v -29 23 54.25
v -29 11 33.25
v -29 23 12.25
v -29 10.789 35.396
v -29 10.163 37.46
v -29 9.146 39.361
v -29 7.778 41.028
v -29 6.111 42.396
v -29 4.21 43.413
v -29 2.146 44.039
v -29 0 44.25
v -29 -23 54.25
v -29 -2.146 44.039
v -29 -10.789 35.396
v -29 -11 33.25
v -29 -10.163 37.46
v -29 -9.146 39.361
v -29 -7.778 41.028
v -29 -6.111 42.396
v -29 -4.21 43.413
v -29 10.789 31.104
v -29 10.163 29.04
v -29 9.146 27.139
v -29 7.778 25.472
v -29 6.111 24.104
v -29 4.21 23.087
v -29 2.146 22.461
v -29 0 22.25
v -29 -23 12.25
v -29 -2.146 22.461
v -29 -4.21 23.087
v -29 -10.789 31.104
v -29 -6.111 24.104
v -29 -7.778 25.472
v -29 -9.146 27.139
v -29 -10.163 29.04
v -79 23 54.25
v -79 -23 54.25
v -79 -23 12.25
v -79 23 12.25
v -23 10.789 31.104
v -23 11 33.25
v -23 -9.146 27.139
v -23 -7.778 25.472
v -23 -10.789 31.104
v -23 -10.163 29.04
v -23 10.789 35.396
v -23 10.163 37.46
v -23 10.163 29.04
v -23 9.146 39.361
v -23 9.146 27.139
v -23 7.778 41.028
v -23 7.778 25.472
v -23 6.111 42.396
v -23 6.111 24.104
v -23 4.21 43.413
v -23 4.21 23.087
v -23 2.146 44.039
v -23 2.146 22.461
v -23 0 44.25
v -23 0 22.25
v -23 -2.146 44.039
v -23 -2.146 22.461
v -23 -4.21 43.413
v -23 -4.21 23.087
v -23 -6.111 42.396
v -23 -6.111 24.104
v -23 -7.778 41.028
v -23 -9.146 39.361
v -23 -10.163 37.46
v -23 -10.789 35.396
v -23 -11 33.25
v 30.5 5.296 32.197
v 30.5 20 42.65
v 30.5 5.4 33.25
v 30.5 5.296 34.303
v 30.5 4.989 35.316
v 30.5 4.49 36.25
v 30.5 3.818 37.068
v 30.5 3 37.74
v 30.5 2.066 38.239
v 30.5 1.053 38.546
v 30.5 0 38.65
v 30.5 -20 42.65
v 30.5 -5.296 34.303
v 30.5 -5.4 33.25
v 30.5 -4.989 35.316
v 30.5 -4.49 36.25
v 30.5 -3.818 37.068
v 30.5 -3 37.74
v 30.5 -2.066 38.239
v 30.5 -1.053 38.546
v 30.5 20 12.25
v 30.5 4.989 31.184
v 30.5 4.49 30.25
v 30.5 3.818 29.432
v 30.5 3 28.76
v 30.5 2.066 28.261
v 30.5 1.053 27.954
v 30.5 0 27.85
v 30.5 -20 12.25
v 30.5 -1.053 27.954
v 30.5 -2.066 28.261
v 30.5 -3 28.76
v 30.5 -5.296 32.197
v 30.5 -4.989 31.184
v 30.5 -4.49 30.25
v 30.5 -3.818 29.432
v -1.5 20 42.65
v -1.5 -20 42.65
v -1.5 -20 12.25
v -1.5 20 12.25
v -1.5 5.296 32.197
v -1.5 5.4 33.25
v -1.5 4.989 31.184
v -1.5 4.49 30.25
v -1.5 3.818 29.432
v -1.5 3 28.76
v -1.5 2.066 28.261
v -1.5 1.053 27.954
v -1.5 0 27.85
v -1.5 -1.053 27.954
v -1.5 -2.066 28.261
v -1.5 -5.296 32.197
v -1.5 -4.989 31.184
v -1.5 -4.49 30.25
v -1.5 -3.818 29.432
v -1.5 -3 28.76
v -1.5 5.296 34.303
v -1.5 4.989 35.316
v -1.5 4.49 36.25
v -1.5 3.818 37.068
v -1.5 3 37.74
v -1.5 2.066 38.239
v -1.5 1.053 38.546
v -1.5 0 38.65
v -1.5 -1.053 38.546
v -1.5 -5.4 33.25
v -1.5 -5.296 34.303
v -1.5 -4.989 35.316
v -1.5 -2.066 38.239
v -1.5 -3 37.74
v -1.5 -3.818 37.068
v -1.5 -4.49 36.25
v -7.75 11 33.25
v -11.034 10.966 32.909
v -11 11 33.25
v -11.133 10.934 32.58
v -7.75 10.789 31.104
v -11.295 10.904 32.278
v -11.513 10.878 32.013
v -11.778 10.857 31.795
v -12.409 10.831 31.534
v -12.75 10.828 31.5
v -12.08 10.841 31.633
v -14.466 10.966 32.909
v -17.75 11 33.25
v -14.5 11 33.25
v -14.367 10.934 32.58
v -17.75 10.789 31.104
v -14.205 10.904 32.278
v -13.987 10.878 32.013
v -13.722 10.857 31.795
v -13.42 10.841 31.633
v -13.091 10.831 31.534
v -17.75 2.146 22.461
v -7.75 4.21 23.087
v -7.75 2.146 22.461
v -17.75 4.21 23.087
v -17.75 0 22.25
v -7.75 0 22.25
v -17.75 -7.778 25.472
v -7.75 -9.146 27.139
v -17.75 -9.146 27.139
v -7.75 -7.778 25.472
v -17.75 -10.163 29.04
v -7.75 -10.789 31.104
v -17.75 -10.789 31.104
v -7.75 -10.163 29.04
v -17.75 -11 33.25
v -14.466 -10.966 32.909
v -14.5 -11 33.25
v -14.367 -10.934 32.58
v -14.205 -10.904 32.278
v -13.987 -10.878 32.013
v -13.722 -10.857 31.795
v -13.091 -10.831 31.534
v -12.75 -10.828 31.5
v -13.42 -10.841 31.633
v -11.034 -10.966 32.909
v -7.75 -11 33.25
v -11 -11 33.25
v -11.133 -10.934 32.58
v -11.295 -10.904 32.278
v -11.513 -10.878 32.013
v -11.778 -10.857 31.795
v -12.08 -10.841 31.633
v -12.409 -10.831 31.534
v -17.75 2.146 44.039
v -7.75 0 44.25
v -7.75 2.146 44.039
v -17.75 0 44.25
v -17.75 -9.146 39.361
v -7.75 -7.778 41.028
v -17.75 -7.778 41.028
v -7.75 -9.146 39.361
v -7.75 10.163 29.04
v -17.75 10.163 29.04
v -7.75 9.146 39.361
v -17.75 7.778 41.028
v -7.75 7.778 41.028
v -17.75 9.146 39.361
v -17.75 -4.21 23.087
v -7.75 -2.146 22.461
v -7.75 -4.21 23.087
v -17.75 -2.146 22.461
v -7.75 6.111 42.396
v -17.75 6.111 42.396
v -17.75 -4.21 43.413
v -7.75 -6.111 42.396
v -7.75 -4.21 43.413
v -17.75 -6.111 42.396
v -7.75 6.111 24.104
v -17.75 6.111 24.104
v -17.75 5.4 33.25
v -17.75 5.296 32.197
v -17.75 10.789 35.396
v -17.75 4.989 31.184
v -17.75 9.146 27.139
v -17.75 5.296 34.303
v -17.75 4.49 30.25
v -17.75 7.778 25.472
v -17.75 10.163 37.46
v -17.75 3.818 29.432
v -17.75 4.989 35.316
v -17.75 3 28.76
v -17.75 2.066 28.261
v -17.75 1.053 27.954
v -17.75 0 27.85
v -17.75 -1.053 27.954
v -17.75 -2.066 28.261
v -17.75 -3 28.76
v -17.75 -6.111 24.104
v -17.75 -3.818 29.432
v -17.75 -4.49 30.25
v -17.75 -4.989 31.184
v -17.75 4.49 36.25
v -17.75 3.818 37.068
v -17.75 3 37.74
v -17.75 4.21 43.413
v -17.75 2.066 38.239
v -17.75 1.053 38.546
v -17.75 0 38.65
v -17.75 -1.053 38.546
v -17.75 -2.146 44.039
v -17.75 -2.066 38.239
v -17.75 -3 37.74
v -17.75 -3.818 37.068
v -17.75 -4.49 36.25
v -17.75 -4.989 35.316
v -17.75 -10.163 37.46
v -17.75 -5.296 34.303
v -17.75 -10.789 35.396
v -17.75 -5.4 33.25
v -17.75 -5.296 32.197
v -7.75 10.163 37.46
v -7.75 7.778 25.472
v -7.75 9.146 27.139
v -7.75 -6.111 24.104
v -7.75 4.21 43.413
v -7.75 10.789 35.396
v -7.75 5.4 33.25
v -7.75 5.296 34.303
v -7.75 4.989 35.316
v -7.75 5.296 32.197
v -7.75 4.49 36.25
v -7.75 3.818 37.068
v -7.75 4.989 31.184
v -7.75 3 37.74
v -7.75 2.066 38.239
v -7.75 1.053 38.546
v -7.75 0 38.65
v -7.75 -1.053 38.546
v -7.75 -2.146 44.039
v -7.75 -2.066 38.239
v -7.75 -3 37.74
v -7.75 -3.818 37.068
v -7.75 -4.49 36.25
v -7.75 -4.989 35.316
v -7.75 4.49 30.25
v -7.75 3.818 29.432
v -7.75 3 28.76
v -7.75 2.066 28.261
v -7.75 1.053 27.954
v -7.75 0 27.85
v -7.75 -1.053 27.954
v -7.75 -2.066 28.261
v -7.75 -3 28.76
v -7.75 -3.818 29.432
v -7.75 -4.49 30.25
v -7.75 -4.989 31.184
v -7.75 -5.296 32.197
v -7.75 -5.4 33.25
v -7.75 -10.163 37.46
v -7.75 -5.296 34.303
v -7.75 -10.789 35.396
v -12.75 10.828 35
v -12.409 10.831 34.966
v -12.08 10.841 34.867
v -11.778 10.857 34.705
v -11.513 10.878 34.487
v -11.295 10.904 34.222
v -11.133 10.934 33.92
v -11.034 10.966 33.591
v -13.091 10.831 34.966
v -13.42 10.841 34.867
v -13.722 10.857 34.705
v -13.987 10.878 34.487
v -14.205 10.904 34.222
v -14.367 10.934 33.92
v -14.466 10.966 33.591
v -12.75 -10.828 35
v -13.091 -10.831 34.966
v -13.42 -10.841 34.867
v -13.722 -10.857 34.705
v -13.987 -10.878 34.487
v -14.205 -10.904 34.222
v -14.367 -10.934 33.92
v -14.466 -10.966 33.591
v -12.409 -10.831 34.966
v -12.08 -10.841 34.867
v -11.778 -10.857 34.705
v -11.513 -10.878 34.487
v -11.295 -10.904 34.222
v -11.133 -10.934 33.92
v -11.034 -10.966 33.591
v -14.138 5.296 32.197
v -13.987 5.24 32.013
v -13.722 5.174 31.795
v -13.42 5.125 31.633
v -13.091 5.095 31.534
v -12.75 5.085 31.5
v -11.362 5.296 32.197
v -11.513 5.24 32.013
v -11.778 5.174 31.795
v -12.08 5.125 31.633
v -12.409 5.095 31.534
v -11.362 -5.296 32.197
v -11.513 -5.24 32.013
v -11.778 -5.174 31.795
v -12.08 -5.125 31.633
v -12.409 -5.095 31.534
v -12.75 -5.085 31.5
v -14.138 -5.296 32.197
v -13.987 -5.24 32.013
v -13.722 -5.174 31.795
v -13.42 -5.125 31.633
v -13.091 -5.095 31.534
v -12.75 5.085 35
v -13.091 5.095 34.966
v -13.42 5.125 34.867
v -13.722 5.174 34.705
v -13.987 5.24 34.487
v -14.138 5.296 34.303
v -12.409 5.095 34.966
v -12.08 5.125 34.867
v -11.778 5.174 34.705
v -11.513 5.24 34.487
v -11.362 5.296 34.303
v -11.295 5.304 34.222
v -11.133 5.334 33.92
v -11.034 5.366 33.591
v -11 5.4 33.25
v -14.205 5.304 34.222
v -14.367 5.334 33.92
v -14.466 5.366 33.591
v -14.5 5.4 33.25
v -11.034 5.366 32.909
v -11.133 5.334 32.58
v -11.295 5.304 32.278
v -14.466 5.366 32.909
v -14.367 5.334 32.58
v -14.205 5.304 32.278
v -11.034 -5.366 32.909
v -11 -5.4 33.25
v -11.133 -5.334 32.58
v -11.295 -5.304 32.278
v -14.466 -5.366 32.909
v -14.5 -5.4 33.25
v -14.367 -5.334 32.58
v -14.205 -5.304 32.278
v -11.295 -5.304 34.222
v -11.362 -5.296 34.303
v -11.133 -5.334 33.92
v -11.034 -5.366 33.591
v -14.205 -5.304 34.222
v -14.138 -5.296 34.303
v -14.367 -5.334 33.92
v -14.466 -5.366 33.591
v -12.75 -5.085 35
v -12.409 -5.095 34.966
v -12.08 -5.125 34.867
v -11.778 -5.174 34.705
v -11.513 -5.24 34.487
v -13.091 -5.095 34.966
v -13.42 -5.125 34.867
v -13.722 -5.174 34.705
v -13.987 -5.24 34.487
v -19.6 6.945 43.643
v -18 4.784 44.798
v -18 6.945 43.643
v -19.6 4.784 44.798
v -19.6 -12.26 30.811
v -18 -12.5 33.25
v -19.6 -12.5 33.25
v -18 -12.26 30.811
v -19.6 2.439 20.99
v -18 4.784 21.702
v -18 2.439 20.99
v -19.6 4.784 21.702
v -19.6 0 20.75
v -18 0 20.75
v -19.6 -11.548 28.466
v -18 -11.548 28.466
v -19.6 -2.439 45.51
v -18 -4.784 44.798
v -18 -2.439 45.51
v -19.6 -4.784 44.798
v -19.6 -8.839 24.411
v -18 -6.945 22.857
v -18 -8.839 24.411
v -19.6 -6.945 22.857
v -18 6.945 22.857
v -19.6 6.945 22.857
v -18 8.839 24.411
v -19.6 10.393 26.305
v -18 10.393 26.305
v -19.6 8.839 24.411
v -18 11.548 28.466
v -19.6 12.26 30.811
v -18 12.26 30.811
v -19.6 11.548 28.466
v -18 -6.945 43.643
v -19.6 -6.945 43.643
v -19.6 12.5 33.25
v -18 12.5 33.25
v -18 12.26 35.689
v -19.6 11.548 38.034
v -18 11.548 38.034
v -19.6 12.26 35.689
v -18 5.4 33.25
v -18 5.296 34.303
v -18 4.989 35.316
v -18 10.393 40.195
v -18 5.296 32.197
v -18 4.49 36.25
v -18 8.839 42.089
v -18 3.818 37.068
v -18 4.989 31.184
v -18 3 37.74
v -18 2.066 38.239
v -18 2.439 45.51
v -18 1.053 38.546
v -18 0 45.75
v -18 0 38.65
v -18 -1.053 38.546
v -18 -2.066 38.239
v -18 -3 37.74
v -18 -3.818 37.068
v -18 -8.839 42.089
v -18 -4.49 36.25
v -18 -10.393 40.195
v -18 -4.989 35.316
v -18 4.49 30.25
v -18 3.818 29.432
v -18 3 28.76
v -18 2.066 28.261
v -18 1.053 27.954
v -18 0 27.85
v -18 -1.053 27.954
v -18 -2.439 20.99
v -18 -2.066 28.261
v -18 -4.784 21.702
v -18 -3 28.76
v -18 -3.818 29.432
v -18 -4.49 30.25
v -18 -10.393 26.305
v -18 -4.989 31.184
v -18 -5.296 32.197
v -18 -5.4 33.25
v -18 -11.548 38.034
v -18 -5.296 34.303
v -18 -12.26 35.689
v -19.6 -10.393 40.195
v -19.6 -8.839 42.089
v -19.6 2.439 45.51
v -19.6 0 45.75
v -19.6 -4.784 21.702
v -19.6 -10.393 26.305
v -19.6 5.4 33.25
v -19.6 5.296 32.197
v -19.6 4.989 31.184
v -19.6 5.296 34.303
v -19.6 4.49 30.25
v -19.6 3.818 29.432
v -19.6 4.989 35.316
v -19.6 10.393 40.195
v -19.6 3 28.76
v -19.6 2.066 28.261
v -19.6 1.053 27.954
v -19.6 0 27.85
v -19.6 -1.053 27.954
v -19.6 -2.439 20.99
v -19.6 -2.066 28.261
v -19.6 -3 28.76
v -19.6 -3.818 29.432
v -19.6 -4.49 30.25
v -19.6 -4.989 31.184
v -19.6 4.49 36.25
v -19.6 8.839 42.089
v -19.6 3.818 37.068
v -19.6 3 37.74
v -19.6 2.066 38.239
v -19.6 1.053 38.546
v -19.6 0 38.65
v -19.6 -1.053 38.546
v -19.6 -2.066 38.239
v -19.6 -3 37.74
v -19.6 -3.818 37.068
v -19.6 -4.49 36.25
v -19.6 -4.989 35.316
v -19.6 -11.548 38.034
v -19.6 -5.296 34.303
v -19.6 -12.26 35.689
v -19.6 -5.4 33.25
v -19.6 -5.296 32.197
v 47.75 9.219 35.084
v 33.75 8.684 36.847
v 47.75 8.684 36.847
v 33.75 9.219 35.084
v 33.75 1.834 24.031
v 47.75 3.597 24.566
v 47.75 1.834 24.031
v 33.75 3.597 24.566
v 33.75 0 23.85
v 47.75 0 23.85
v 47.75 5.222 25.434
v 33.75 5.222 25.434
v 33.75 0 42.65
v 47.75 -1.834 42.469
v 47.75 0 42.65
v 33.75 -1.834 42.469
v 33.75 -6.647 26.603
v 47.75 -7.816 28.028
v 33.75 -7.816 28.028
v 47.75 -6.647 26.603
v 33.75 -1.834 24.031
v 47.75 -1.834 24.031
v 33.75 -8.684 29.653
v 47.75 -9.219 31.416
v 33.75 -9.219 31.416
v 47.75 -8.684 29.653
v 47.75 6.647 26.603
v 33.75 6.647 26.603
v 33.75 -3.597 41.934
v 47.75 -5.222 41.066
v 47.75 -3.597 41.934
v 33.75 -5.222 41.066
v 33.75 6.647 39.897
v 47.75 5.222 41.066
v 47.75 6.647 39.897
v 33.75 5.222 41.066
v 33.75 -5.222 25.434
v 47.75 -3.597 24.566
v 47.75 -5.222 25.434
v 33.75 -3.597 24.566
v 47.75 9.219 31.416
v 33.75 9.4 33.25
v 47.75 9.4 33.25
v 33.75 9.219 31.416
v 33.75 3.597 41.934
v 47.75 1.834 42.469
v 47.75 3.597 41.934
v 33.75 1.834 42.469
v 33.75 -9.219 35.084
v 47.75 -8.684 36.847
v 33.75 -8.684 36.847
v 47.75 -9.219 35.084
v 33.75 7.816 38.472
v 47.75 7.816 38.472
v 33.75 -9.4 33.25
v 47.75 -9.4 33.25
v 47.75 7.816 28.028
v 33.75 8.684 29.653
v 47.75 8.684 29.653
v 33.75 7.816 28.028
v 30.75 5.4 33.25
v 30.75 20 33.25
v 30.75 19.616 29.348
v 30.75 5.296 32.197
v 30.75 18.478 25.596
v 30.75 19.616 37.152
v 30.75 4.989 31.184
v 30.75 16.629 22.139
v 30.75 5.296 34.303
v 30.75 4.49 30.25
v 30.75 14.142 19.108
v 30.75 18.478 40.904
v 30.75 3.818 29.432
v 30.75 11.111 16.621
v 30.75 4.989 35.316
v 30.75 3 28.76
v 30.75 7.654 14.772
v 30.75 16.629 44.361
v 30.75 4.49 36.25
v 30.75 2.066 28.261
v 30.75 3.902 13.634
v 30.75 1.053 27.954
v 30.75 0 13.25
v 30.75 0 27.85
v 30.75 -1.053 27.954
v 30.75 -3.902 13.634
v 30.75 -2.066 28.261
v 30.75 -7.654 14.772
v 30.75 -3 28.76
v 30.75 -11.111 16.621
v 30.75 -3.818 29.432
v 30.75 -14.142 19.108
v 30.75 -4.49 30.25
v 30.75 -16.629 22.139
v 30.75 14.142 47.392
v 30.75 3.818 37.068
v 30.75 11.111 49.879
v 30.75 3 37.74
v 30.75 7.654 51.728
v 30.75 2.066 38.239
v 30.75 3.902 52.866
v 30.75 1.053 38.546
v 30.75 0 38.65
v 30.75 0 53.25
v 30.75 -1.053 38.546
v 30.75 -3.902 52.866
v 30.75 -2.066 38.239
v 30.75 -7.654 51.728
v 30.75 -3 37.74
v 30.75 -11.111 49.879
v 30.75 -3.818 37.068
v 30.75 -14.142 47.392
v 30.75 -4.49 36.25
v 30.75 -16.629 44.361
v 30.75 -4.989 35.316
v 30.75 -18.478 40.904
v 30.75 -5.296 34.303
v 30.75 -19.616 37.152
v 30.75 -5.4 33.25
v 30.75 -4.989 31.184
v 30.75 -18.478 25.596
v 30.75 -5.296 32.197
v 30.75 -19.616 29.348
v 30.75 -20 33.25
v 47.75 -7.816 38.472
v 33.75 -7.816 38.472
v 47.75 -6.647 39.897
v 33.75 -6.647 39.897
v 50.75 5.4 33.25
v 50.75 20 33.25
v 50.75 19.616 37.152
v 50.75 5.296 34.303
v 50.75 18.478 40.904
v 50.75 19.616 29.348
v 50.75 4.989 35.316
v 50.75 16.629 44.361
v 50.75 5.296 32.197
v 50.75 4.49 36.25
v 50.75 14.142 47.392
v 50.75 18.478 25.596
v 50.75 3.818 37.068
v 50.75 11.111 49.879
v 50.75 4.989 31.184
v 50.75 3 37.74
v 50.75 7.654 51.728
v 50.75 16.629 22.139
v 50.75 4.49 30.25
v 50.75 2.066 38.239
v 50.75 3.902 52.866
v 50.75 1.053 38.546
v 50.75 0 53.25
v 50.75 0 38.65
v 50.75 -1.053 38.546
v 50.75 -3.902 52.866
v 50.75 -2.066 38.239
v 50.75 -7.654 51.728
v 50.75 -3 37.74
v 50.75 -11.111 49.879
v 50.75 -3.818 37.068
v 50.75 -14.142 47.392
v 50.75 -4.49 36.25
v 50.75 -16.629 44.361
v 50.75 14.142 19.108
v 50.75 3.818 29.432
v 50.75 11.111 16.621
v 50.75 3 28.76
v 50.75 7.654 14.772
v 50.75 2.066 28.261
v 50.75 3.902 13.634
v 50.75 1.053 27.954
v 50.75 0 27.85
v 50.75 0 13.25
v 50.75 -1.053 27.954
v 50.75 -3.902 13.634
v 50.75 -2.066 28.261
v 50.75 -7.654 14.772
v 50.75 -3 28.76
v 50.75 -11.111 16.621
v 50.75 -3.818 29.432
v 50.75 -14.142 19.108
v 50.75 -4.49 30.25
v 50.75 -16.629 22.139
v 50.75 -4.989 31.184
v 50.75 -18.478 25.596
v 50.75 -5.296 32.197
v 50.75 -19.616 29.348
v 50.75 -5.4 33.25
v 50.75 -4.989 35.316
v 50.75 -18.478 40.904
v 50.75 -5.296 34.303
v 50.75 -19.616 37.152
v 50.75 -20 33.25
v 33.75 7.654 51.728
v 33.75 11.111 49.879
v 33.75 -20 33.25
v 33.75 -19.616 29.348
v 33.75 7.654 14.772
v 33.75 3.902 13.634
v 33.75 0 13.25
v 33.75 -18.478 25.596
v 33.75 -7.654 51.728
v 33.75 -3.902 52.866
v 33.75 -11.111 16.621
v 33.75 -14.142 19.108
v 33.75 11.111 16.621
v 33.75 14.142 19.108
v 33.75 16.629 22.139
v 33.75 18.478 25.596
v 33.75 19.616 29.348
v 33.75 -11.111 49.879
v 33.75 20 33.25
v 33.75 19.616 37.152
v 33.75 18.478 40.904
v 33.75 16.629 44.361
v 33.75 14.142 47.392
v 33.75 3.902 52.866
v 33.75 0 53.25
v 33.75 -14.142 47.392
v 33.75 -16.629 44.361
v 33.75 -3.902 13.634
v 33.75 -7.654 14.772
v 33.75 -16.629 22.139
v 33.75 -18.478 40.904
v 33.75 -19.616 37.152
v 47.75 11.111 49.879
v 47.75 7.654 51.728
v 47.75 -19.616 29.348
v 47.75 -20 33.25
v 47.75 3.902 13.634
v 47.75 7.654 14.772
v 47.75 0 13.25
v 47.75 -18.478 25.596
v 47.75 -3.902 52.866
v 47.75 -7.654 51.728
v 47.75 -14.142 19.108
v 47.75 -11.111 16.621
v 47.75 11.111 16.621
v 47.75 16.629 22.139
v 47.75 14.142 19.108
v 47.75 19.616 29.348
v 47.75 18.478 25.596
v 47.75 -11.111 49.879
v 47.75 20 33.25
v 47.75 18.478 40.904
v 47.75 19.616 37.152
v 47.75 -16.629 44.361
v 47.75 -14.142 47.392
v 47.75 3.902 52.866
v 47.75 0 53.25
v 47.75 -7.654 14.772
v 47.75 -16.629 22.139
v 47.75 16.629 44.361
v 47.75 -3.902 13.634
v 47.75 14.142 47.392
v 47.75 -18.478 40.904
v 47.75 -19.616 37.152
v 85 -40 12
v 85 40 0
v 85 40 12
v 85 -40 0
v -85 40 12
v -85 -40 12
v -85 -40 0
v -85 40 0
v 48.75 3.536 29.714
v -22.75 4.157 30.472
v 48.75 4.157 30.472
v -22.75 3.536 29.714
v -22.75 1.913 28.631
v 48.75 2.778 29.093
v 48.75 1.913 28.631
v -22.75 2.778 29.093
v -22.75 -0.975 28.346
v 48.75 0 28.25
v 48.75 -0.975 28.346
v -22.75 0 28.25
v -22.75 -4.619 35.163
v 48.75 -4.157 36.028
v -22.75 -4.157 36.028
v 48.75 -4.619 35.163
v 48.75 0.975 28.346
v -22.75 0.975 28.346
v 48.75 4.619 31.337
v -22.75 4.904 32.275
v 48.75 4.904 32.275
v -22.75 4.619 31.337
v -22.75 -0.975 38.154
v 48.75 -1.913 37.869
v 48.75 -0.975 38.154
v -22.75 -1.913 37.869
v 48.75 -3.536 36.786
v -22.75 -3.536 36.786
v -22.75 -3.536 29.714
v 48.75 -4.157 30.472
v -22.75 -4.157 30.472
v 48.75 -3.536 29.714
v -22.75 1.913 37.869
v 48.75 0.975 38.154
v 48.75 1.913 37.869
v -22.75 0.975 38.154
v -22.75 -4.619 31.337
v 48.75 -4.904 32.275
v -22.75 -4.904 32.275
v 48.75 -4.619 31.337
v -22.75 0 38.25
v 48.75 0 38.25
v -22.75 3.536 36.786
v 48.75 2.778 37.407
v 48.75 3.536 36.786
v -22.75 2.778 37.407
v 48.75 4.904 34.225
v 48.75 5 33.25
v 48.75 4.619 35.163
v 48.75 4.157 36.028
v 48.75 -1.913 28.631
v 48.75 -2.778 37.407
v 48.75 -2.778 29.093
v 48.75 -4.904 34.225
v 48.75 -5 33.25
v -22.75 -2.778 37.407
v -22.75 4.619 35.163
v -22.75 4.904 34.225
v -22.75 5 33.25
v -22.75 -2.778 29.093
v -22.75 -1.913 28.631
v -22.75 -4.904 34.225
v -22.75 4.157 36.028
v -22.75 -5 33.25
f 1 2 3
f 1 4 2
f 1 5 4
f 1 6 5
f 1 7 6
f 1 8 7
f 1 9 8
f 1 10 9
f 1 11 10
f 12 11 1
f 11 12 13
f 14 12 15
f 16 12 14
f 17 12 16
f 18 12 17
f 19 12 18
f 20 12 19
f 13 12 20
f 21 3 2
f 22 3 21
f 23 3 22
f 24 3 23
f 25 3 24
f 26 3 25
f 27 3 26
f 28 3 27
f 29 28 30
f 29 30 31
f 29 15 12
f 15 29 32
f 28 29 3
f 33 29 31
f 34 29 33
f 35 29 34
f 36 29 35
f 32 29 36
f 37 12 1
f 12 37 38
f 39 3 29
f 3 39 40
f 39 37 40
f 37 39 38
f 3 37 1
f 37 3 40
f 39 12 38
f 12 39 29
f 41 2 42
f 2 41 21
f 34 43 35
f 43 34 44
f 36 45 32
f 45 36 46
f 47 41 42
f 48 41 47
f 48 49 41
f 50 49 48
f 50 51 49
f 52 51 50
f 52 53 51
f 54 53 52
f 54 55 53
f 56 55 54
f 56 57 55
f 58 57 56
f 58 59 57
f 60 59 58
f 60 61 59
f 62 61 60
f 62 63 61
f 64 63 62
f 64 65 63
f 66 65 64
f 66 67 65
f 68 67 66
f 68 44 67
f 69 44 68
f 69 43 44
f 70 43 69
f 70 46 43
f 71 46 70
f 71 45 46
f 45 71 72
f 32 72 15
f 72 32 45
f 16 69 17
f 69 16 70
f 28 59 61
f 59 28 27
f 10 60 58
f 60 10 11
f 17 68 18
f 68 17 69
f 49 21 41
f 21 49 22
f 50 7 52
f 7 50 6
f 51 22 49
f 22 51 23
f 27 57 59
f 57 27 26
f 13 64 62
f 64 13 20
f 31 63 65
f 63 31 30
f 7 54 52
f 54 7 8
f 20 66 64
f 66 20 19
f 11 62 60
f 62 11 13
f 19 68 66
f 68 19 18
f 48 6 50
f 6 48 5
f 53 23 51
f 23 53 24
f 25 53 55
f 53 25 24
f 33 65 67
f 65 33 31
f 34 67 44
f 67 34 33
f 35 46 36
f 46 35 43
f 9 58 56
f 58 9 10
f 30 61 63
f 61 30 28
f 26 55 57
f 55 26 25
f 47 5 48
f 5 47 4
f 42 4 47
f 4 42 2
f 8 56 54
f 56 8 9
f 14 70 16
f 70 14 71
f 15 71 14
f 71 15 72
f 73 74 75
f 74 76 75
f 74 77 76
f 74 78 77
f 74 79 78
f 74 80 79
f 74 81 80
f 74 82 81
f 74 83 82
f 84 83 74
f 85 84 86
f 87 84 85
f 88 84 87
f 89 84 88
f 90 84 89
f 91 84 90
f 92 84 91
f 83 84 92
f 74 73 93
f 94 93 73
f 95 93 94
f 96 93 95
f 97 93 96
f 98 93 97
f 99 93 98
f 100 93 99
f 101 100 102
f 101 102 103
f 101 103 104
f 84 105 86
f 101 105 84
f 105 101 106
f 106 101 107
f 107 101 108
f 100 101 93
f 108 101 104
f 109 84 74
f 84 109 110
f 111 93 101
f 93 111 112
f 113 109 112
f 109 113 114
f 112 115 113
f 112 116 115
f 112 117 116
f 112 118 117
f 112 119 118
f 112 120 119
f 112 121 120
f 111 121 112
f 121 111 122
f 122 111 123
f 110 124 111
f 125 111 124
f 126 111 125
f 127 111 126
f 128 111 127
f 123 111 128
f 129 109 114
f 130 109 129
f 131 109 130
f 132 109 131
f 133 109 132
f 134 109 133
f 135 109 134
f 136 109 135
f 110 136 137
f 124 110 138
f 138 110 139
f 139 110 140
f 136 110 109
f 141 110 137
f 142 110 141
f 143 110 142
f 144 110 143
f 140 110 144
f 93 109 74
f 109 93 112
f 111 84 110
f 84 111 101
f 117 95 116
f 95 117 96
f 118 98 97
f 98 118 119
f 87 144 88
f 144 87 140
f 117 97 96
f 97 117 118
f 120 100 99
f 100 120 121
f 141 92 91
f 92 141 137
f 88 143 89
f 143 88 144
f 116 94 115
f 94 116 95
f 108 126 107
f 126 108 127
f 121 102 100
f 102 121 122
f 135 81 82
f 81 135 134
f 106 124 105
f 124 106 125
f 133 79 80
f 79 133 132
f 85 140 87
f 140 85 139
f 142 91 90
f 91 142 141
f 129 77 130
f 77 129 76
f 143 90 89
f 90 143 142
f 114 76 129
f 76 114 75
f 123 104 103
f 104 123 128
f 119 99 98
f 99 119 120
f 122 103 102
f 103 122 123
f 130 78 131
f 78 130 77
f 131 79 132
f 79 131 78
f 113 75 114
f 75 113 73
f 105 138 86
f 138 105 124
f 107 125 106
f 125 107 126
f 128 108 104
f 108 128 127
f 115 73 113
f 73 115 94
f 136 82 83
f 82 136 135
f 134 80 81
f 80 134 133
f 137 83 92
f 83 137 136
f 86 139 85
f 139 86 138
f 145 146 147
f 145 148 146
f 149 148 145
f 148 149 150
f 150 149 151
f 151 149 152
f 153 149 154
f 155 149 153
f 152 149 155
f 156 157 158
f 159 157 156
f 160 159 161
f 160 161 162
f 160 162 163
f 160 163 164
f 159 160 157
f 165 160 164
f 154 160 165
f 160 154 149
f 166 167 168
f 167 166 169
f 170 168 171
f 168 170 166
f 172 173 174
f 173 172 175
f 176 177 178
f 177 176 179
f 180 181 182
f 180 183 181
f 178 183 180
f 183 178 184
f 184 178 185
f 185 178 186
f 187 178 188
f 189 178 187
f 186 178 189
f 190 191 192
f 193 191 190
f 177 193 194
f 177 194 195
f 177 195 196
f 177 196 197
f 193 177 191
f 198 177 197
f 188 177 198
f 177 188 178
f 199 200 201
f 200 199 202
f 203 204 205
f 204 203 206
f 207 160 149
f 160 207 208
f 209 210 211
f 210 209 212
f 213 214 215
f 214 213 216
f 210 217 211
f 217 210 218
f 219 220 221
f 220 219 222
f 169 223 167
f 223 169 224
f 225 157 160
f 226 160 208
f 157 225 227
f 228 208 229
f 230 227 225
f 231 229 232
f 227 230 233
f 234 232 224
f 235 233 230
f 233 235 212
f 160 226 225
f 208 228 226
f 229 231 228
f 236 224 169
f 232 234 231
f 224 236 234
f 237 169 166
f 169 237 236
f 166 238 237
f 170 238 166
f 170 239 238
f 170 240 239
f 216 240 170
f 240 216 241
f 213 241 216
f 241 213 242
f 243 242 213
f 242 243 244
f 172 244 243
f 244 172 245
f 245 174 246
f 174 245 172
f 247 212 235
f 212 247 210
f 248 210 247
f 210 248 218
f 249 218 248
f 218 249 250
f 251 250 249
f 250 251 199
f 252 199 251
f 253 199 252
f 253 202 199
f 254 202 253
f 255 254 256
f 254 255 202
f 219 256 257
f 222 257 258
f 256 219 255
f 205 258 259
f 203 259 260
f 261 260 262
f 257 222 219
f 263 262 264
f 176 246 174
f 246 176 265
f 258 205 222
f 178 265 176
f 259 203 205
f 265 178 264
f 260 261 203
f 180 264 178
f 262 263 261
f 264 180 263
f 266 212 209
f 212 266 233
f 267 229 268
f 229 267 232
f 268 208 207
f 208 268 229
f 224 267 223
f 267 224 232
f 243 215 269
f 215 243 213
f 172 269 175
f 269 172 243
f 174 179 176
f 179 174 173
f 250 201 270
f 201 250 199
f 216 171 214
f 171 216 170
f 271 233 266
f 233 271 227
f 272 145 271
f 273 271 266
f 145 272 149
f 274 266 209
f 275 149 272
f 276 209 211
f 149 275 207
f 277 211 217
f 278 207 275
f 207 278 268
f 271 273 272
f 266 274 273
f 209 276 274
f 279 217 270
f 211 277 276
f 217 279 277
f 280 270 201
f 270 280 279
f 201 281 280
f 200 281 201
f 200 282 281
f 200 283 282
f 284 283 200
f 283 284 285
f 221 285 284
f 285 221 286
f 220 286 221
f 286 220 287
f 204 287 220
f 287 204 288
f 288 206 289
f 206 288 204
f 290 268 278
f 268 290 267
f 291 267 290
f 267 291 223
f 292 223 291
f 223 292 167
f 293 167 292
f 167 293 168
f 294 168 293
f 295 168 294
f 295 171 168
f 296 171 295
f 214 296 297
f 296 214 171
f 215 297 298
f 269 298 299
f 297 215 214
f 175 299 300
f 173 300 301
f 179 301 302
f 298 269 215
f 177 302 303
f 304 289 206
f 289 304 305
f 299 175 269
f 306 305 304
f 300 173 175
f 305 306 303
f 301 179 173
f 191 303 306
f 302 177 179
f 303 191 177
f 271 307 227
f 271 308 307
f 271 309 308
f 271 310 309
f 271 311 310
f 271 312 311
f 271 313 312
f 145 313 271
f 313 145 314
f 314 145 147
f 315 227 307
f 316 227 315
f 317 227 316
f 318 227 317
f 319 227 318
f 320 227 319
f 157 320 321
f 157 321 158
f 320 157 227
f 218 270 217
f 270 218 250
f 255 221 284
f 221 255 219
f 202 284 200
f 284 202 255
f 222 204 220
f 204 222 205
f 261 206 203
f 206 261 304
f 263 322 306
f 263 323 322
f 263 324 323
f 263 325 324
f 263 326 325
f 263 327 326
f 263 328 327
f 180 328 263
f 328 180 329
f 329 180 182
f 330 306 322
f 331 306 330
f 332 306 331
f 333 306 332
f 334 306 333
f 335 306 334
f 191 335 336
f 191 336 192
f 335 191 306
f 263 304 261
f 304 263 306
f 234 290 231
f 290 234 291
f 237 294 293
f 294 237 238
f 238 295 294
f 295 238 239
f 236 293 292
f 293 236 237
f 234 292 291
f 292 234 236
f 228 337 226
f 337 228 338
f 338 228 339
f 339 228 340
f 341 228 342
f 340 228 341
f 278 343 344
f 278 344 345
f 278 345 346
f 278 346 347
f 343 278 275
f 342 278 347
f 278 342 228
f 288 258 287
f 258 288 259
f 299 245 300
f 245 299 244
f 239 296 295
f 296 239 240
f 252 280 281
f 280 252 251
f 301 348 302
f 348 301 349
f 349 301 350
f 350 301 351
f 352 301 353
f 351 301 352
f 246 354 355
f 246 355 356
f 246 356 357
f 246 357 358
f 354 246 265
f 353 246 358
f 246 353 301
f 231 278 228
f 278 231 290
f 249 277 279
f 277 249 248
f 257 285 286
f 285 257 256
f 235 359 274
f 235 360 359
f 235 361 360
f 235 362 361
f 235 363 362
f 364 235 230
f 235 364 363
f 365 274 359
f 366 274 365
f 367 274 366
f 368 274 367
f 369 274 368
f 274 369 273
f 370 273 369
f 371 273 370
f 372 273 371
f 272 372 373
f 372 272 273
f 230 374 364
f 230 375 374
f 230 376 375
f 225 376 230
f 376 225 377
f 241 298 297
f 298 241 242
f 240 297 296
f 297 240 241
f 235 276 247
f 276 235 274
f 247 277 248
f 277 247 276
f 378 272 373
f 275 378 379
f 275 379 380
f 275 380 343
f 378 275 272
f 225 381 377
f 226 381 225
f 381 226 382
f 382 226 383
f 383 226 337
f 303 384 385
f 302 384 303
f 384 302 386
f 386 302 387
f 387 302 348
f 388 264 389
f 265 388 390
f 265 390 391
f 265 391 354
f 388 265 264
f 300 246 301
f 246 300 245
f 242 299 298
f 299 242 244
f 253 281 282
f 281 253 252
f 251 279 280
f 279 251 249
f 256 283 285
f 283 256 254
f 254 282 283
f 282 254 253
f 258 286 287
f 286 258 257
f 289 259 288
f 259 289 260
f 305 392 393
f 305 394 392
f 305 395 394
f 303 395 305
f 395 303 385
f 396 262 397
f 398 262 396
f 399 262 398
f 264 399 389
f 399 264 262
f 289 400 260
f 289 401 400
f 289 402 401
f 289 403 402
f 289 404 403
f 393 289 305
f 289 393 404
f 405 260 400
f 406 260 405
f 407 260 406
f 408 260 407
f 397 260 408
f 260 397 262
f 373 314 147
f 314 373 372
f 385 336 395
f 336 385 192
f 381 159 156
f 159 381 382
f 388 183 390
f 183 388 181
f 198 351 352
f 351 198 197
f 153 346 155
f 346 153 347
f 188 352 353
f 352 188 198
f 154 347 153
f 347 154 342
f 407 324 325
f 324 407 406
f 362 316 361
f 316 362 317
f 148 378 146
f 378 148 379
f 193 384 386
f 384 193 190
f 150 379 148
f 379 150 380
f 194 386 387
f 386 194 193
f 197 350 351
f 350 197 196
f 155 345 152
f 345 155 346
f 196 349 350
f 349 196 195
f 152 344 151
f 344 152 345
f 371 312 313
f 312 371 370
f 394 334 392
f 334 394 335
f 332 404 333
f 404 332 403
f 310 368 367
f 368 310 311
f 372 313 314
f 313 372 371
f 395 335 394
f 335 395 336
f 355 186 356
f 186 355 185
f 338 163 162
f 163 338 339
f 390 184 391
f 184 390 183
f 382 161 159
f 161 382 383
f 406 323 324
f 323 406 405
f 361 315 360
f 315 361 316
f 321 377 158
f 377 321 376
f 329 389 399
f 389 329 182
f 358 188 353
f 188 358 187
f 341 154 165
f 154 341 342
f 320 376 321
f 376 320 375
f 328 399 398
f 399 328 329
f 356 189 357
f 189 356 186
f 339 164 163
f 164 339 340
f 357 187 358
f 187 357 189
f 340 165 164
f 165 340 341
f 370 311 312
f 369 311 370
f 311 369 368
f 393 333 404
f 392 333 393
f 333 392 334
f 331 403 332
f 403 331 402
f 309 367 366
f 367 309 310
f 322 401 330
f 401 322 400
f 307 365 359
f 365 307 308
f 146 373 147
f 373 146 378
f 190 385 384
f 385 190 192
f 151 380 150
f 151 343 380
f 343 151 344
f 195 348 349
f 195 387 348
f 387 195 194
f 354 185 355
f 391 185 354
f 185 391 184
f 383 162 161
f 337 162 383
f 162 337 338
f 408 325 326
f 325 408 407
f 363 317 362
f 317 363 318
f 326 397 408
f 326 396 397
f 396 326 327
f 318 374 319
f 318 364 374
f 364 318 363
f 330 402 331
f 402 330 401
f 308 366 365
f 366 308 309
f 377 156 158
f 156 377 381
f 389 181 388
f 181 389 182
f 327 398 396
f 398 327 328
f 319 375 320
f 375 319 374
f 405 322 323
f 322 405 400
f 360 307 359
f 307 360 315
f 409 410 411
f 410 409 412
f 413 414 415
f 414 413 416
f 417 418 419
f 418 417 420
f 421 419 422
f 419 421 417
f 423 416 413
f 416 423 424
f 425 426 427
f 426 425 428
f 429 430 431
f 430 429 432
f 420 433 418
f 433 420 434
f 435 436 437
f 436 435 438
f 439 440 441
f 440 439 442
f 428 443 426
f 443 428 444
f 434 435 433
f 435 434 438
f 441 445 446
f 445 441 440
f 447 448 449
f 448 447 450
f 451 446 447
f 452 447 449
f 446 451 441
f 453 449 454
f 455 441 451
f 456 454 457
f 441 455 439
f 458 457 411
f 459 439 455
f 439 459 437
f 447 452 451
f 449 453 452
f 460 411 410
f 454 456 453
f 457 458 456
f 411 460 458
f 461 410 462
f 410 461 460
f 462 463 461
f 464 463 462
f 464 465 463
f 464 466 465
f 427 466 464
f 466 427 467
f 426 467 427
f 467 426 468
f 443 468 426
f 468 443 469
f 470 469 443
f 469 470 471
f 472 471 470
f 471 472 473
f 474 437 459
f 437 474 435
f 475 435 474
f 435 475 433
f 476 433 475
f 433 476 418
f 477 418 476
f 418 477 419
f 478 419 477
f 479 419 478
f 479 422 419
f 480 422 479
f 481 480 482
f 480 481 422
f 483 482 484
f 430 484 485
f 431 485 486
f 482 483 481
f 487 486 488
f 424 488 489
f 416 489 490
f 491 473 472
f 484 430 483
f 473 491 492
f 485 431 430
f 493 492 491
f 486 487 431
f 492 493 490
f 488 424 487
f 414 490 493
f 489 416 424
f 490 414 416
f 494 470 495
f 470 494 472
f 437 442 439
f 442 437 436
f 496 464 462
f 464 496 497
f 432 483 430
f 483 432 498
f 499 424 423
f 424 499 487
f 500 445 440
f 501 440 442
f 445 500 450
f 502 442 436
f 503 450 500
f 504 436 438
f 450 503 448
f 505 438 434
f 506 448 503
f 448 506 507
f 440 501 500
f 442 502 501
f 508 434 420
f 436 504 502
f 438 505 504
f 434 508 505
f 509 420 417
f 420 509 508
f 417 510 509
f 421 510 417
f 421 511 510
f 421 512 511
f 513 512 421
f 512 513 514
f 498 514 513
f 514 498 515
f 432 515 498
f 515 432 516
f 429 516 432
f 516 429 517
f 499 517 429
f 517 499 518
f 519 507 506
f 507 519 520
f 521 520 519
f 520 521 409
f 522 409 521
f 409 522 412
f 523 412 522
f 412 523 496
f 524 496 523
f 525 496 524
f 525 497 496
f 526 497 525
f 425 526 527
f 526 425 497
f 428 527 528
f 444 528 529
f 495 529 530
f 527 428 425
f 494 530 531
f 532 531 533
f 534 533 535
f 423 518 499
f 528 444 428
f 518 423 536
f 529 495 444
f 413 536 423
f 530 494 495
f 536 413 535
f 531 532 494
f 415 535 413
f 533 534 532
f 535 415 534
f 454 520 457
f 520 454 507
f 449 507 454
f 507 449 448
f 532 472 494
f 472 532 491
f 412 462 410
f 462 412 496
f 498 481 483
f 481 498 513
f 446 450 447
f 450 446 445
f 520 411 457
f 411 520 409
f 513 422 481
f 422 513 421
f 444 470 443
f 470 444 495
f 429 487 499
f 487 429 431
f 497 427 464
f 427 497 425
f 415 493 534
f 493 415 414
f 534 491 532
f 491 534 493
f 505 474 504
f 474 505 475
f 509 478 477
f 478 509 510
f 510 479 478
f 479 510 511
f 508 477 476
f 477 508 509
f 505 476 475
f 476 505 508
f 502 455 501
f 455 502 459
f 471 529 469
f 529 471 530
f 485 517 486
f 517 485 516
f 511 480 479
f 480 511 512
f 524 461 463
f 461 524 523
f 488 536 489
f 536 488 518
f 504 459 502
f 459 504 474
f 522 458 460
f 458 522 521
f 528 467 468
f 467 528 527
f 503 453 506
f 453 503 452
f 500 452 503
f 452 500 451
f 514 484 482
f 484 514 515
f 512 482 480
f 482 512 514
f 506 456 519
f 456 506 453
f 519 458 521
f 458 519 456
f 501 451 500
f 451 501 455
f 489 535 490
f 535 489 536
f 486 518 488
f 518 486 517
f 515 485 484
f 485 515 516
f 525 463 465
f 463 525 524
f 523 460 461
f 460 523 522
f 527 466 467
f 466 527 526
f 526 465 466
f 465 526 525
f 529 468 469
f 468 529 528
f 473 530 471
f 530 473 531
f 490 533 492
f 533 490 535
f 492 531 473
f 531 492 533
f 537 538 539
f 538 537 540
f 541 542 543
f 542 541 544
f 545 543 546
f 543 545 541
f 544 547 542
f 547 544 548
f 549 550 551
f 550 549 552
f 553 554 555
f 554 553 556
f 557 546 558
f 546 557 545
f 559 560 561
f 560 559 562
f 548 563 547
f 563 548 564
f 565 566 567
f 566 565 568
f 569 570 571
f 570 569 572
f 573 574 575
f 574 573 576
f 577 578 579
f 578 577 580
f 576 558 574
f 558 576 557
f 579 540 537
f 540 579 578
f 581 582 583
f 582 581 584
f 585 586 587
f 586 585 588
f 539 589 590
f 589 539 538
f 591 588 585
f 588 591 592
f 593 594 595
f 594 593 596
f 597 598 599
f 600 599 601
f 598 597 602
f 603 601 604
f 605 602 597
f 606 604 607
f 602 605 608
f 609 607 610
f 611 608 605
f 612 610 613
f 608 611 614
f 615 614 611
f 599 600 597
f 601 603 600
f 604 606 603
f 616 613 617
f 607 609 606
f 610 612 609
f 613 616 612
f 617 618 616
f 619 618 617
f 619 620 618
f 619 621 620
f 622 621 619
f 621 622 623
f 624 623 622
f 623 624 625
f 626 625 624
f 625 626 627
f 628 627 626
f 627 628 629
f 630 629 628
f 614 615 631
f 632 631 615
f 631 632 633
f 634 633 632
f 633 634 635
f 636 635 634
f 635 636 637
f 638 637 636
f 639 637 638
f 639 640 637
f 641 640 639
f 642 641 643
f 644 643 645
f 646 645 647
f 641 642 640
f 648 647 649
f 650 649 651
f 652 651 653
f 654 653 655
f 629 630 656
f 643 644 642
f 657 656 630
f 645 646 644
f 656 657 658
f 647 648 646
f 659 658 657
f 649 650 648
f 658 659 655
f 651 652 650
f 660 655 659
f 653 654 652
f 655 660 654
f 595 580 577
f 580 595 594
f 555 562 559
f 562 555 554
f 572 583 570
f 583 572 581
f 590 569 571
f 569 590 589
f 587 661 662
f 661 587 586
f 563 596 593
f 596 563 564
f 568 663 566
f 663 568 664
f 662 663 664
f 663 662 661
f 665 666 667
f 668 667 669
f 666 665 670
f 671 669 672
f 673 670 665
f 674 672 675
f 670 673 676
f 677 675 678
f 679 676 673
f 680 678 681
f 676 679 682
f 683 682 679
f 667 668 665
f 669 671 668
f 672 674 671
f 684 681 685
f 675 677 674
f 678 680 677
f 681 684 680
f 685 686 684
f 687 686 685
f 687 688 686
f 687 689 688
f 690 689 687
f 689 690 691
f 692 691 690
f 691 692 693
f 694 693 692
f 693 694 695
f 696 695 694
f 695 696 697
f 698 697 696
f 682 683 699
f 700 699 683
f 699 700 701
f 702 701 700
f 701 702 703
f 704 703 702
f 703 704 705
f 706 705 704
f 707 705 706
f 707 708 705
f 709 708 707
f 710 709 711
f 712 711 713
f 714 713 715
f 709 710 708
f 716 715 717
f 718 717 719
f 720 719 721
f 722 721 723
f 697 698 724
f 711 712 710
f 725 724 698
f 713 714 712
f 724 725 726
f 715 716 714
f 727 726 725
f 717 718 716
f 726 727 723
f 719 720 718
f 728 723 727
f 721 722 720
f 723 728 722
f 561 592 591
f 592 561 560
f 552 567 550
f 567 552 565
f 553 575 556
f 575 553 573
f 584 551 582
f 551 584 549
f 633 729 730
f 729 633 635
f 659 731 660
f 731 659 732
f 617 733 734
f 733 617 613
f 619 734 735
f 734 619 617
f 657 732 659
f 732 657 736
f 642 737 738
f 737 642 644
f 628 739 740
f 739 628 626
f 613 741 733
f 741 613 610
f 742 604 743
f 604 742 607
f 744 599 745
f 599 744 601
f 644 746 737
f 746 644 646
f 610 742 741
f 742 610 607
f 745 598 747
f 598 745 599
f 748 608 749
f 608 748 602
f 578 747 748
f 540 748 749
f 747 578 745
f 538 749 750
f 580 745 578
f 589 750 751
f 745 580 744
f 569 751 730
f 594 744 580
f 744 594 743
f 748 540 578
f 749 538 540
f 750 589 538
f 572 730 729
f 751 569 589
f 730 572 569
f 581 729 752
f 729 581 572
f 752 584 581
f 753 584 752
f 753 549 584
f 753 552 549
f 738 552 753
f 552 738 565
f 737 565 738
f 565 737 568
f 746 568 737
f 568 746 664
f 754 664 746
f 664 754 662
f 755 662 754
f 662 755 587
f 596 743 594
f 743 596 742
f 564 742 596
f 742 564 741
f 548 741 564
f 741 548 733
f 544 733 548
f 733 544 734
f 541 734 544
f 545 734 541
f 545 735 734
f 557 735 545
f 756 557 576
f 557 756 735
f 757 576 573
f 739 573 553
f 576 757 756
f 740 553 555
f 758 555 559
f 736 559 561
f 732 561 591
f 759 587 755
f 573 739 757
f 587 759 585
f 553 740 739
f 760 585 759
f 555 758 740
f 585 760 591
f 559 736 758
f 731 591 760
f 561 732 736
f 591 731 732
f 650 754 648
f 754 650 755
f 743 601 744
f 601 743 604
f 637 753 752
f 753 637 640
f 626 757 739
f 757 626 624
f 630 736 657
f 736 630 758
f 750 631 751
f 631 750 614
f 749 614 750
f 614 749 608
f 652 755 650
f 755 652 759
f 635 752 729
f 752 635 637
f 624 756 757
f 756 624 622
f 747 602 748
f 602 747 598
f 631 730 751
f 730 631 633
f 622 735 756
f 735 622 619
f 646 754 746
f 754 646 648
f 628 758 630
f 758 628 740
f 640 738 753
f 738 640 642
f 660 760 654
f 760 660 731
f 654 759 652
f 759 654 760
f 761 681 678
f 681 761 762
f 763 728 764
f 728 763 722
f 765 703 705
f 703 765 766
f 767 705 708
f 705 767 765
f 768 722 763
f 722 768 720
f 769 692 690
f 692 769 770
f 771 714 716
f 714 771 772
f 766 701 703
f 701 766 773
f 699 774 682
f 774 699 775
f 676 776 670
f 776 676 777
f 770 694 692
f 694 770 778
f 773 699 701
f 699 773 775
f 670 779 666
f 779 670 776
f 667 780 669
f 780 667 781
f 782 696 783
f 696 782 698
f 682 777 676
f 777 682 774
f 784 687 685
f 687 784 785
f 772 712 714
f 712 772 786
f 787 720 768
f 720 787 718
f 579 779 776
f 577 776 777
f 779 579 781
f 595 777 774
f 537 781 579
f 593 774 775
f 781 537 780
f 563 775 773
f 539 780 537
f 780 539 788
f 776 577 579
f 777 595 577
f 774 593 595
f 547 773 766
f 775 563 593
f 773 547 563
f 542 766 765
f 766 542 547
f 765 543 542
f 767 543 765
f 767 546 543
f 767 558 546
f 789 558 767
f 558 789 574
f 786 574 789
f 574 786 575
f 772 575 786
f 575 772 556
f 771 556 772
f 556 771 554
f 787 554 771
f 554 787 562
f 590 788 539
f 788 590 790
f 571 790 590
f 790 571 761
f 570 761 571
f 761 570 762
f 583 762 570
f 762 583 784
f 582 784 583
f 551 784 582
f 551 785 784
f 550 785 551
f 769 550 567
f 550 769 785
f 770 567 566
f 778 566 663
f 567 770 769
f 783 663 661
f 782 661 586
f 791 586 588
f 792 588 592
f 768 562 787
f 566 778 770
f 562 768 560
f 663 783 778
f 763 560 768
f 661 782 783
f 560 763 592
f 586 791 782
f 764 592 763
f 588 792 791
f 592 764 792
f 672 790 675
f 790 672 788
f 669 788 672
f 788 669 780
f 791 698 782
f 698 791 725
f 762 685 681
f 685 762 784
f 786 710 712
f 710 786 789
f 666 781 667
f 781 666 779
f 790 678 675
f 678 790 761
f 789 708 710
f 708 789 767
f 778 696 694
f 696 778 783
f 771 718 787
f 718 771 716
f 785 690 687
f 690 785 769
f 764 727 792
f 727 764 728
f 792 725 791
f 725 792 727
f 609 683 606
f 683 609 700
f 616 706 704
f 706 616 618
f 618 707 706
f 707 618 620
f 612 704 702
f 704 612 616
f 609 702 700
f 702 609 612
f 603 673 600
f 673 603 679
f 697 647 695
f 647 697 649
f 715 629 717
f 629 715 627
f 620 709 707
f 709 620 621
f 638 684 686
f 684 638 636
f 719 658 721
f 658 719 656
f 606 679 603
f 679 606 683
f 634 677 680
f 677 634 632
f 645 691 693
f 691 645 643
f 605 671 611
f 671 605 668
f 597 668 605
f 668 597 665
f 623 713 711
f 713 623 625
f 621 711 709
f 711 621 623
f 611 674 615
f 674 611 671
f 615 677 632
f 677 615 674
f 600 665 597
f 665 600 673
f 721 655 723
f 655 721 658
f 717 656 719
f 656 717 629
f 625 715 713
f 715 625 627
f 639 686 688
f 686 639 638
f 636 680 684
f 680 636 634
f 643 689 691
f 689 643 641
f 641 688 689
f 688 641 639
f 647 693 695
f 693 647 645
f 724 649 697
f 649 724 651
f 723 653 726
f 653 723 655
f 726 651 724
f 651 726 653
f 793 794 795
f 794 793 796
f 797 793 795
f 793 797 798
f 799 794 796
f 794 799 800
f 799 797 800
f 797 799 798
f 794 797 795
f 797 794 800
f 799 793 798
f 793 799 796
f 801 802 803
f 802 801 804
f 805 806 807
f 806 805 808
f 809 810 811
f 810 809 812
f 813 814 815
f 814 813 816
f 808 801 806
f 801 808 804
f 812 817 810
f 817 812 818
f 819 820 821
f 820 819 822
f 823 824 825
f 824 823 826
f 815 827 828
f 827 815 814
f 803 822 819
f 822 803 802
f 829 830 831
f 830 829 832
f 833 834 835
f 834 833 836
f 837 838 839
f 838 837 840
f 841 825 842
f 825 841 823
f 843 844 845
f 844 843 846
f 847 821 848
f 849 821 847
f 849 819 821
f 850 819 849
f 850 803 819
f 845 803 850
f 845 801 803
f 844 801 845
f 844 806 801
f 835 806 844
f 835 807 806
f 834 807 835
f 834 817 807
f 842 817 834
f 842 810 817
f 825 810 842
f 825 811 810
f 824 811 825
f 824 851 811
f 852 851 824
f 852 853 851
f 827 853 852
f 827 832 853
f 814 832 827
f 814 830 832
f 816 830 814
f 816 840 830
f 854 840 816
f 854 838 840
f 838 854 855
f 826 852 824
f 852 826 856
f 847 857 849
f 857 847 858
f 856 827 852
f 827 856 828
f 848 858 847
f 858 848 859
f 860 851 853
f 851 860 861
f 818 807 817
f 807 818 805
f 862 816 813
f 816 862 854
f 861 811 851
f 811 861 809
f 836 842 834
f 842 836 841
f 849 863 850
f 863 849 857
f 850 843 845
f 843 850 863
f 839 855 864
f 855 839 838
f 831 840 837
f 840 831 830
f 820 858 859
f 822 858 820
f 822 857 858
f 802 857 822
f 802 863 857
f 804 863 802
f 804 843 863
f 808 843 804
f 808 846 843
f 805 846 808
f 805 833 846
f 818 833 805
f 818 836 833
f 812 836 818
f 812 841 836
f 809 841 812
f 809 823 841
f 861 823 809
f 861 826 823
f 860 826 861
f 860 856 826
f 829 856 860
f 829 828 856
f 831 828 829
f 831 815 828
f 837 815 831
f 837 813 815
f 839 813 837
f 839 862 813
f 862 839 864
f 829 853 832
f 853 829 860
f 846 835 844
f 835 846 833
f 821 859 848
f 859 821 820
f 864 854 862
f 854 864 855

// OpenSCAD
$fn = 32;

// ------------------------------------------------------------------------
// Motor drive station: motor 50 x 42 mm, shaft d10, pulley d40
// Every part is its own module, assembly() places every instance.
// ------------------------------------------------------------------------

// --- part 1 ---
module station_bed() {
  difference() {
    translate([-85, -40, 0]) cube([170, 80, 12]);
  }
}

// --- part 2 ---
module drive_motor() {
  union() {
    translate([-25, -23, 0]) cube([50, 46, 42]);
    translate([28, 0, 21]) rotate([0, 90, 0]) cylinder(h = 6, d = 22, center = true);
  }
}

// --- part 3 ---
module pillow_block() {
  difference() {
    translate([-16, -20, 0]) cube([32, 40, 30.4]);
    translate([0, 0, 21]) rotate([0, 90, 0]) cylinder(h = 34, d = 10.8, center = true);
  }
}

// --- part 4 ---
module drive_shaft() {
  translate([0, 0, -35.75]) cylinder(h = 71.5, d = 10);
}

// --- part 5 ---
module shaft_collar() {
  difference() {
    cylinder(h = 10, d = 22);
    translate([0, 0, -1]) cylinder(h = 12, d = 10.8);
    translate([0, 0, 5]) rotate([90, 0, 0]) cylinder(h = 24, d = 3.5, center = true);
  }
}

// --- part 6 ---
module collar_washer() {
  difference() {
      translate([0, 0, 0]) cylinder(h = 1.6, d = 25);
      translate([0, 0, -1]) cylinder(h = 3.6, d = 10.8);
    }
}

// --- part 7 ---
module drive_pulley() {
  difference() {
    union() {
      cylinder(h = 20, d = 18.8);
      cylinder(h = 3, d = 40);
      translate([0, 0, 17]) cylinder(h = 3, d = 40);
    }
    translate([0, 0, -1]) cylinder(h = 22, d = 10.8);
  }
}

// --- assembly ---
module assembly() {
  color([0.80, 0.24, 0.20]) translate([0, 0, 0]) rotate([0, 0, 0]) station_bed();
  color([0.20, 0.45, 0.75]) translate([-54, 0, 12.25]) rotate([0, 0, 0]) drive_motor();
  color([0.25, 0.62, 0.32]) translate([14.5, 0, 12.25]) rotate([0, 0, 0]) pillow_block();
  color([0.92, 0.70, 0.18]) translate([13, 0, 33.25]) rotate([0, 90, 0]) drive_shaft();
  color([0.58, 0.35, 0.70]) translate([-17.75, 0, 33.25]) rotate([0, 90, 0]) shaft_collar();
  color([0.16, 0.66, 0.66]) translate([-19.6, 0, 33.25]) rotate([0, 90, 0]) collar_washer();
  color([0.85, 0.48, 0.18]) translate([30.75, 0, 33.25]) rotate([0, 90, 0]) drive_pulley();
}

assembly();
